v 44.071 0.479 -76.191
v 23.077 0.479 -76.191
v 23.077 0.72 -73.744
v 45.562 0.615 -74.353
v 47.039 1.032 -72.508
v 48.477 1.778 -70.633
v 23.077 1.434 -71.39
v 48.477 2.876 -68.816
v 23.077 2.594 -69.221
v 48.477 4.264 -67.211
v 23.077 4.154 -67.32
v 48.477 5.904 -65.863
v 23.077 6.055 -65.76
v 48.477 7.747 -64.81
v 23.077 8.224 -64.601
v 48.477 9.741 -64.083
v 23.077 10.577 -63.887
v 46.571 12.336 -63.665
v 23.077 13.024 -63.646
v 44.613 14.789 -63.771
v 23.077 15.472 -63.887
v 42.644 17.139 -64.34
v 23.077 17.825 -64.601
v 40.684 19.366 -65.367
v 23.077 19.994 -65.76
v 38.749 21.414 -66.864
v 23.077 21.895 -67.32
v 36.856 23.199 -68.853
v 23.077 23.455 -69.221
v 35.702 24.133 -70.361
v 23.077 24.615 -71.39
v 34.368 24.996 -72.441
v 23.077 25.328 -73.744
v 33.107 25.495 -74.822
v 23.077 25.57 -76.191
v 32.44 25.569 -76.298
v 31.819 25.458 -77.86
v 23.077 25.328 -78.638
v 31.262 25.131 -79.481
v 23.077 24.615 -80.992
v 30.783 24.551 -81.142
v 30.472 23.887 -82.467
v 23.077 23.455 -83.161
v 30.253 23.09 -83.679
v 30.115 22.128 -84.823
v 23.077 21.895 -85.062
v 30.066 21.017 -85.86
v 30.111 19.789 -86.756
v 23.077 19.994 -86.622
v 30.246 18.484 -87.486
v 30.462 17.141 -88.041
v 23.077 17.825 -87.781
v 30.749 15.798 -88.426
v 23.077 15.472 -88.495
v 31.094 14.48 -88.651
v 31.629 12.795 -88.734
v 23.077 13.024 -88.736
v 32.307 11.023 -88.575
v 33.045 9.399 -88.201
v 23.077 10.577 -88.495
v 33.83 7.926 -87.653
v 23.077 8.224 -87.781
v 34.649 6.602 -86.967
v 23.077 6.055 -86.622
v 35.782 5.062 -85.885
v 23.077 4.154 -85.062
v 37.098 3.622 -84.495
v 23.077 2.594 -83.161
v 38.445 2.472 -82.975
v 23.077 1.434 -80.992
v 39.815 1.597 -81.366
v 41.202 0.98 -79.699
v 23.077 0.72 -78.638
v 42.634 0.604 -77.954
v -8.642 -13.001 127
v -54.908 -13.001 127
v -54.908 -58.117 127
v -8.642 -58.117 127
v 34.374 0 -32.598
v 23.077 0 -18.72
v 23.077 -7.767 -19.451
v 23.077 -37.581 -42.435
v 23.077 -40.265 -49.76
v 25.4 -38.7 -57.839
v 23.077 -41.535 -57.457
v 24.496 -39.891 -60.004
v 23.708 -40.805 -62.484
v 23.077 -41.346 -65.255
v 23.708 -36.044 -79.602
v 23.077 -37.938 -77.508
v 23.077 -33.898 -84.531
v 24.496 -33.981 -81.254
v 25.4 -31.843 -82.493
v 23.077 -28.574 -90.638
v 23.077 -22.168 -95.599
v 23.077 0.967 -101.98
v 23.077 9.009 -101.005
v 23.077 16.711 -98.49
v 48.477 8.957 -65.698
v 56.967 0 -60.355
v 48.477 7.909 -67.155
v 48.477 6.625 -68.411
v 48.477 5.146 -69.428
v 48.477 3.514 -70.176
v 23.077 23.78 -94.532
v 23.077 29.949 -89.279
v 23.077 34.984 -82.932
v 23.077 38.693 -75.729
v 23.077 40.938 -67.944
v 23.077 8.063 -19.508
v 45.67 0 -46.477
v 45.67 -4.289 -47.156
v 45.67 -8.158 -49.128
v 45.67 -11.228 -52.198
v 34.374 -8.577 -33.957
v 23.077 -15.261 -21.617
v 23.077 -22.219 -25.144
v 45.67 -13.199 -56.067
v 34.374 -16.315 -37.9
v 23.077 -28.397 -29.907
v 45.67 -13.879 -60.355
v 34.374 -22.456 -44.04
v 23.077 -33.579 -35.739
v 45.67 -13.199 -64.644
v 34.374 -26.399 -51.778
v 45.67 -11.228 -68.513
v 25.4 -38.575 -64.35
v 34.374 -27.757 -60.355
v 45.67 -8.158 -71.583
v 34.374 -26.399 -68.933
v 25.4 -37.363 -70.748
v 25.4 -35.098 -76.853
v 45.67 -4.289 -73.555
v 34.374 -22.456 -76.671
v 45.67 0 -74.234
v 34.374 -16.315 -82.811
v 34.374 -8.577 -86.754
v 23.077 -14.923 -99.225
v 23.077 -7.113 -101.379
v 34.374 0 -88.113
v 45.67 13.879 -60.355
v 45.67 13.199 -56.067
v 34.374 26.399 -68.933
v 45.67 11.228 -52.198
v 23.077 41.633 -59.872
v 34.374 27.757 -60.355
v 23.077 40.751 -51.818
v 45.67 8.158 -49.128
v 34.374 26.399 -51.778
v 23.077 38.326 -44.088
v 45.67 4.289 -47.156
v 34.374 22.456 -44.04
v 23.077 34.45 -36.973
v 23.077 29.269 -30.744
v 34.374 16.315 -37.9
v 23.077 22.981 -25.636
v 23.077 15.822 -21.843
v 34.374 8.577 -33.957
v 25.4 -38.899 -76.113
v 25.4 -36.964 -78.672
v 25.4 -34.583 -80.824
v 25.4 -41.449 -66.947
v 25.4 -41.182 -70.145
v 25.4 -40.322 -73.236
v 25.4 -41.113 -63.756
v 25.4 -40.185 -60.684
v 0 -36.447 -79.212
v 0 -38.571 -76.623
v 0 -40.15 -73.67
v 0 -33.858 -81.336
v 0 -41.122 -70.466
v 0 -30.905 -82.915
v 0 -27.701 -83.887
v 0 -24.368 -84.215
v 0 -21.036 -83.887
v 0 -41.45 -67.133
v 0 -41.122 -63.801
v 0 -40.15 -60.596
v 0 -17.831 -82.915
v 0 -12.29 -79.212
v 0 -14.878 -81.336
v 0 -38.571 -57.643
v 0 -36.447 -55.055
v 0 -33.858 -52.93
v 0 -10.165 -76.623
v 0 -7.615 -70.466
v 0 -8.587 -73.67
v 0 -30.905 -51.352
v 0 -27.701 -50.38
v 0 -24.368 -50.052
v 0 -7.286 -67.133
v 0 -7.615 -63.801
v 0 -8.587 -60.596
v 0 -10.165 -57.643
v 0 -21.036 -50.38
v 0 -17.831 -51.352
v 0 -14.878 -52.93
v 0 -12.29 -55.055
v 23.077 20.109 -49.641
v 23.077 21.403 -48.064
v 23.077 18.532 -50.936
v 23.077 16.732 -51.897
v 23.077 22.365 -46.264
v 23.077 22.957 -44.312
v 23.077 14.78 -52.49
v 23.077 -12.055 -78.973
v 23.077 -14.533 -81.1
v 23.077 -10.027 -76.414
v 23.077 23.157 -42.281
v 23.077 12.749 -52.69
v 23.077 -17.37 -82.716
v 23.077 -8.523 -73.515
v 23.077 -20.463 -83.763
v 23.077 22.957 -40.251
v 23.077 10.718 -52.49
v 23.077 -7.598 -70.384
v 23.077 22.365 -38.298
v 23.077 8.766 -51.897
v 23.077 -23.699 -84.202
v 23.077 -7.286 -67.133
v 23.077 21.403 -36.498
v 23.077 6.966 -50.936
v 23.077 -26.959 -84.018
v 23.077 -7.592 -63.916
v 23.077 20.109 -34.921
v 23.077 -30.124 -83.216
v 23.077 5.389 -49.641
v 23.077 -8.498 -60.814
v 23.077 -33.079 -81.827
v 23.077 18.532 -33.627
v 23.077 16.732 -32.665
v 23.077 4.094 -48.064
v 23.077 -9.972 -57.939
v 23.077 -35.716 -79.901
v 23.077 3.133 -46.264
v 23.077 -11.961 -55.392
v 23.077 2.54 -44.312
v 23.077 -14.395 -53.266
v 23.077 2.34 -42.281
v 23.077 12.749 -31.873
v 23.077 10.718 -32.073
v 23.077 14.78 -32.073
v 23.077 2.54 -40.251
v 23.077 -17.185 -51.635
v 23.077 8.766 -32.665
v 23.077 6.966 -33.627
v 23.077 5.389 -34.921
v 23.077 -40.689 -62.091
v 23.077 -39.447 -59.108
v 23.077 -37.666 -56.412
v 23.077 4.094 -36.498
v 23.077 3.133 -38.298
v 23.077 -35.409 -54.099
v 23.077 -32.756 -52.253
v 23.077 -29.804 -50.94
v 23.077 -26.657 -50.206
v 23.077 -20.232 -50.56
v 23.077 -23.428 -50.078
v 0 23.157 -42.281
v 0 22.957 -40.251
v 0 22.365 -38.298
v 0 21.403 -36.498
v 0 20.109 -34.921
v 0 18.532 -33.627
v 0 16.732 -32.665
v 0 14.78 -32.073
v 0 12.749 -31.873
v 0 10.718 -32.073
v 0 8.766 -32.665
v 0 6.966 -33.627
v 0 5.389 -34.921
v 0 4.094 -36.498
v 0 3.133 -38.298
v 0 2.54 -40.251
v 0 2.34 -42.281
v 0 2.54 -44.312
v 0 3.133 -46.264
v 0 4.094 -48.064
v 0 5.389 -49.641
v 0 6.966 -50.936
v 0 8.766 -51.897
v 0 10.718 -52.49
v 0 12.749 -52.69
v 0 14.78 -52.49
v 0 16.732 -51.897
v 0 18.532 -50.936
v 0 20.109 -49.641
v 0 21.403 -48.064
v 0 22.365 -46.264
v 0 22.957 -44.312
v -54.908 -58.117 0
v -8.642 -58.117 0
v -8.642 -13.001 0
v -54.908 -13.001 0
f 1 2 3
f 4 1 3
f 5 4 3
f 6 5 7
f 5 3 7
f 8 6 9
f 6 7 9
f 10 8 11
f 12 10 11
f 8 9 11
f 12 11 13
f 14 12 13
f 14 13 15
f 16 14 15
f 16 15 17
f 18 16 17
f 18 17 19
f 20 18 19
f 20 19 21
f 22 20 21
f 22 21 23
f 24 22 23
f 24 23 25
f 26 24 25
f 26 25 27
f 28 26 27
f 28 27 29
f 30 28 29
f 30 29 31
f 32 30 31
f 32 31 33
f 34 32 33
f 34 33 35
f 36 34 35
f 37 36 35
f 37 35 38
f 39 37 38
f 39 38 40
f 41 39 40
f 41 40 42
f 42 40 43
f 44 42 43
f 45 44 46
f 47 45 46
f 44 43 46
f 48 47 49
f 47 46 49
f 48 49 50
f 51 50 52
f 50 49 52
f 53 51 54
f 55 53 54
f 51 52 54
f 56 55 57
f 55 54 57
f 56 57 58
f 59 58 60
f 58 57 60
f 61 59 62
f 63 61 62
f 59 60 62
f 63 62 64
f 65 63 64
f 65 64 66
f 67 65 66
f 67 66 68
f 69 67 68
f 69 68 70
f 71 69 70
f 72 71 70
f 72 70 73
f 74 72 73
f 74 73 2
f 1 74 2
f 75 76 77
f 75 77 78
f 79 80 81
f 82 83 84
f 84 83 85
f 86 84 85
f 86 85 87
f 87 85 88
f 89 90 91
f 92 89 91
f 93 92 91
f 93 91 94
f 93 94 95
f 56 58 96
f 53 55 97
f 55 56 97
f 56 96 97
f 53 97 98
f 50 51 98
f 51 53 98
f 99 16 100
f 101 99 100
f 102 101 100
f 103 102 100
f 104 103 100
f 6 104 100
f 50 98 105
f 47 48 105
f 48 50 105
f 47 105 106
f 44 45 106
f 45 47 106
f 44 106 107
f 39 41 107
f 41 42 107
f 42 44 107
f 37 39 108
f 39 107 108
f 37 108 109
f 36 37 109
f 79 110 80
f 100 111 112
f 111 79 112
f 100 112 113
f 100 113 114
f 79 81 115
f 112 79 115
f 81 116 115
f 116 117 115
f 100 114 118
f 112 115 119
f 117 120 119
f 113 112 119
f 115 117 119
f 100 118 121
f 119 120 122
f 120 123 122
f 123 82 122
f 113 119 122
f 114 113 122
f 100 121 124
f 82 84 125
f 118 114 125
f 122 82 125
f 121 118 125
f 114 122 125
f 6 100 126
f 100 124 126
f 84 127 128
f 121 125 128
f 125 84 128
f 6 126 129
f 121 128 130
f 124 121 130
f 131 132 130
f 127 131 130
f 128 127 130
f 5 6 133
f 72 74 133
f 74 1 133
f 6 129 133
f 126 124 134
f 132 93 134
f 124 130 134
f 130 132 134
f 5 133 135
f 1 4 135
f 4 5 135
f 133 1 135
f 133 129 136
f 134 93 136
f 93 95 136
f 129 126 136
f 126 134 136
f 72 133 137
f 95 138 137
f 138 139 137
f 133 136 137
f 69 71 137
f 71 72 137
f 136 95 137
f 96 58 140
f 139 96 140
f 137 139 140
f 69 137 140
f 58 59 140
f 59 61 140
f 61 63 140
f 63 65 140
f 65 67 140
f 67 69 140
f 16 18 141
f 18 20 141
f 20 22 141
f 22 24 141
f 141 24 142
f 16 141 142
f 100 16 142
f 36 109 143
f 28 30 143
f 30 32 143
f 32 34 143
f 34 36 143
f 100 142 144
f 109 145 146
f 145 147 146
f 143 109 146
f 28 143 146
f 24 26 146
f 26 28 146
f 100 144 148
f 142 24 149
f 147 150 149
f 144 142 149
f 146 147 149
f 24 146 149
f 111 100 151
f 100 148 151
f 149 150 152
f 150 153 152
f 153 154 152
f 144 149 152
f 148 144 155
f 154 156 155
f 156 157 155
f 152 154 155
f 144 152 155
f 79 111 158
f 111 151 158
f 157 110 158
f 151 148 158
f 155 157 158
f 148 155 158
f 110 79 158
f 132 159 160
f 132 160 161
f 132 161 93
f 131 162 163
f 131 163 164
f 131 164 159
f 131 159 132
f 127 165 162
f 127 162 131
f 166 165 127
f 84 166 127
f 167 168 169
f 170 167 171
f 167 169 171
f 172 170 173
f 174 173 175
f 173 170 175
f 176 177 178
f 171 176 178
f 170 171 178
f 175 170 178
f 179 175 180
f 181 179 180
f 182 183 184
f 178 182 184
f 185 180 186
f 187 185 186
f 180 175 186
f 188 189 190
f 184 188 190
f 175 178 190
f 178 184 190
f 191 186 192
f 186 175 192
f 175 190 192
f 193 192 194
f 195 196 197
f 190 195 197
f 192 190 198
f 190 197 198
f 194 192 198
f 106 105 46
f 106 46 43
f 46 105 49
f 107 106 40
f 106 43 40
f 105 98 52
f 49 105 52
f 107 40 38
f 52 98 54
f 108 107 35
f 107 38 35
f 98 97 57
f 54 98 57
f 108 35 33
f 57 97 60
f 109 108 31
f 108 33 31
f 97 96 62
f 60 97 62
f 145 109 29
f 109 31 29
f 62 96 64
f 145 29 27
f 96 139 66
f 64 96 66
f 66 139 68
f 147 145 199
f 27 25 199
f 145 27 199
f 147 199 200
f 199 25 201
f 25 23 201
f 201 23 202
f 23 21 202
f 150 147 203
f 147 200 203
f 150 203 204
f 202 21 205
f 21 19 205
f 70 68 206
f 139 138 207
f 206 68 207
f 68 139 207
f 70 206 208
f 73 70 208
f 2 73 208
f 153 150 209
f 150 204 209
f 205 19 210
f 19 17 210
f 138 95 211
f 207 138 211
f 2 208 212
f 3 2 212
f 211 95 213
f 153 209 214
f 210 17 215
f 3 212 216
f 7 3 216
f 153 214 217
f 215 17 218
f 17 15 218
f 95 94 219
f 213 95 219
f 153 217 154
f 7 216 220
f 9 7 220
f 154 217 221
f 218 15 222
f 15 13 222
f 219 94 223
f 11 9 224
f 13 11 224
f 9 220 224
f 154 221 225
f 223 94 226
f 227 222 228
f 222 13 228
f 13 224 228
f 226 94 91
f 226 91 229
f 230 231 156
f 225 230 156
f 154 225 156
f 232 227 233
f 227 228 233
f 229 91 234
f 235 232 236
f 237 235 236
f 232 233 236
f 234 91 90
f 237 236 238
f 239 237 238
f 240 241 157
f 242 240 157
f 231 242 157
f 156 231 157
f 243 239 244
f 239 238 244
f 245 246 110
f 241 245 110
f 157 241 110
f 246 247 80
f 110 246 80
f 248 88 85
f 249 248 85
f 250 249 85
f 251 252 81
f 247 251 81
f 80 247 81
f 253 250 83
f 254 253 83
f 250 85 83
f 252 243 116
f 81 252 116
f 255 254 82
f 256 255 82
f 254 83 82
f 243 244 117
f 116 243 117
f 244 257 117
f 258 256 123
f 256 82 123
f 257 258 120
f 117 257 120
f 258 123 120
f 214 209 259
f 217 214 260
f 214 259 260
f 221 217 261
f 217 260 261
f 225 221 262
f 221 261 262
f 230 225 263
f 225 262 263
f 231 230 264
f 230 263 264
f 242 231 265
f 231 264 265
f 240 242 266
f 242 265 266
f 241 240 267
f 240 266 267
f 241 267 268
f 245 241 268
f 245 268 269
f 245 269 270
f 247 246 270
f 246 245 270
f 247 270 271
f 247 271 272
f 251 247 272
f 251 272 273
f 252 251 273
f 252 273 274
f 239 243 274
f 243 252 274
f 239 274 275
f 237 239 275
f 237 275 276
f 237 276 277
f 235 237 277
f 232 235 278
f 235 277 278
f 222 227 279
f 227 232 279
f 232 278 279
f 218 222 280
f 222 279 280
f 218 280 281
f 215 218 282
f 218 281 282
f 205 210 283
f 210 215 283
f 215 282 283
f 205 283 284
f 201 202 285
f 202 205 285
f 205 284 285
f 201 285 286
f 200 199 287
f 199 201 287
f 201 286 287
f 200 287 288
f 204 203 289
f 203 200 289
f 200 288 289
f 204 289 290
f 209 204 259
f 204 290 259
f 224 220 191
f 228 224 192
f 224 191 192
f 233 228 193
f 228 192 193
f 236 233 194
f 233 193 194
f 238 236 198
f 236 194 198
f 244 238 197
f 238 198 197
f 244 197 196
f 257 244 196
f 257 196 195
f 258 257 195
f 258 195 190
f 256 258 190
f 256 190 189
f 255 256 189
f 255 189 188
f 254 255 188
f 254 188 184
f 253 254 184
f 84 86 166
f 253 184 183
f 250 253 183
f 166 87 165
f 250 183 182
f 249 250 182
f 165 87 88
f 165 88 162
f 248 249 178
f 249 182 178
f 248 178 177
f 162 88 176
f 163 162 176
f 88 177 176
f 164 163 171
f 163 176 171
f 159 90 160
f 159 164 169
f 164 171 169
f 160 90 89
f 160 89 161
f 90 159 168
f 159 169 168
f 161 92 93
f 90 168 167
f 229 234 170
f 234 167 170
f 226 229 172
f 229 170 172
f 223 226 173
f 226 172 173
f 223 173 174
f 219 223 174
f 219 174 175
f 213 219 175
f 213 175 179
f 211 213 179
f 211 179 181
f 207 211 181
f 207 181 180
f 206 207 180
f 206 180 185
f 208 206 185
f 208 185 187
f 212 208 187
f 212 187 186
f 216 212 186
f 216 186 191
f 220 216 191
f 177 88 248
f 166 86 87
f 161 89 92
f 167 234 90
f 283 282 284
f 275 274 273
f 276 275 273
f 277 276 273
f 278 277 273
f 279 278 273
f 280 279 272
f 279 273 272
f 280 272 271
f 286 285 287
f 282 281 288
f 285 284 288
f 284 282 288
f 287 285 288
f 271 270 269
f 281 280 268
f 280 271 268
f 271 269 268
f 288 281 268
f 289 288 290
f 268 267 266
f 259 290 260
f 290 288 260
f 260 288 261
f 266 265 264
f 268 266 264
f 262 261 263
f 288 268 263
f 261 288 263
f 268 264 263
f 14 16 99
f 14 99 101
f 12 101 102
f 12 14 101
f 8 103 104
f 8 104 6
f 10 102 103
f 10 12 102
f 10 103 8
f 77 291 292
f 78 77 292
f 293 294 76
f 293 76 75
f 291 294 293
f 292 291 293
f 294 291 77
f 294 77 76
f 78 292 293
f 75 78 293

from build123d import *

# Parameters (mm, degrees)
F0_W     = 46.26578
F0_H     = 45.115725
F1_DEPTH = 127
F4_R     = 10.408583
F4_R_2   = 17.081722
F5_DEPTH = 25.4
F6_R     = 12.545066
F7_DEPTH = 25.4


with BuildPart() as f1:
    # F0 (on Top) → F1 (new body)
    with BuildSketch(Plane.XY):
        with Locations((-31.774823, -35.558864)):
            Rectangle(F0_W, F0_H)
    extrude(amount=F1_DEPTH)


with BuildPart() as f3:
    # F2 (on Front) → F3 (revolve)
    with BuildSketch(Plane.XZ):
        Polygon((56.966539, -60.355488), (23.077099, -18.719885), (23.077099, -60.355488), align=None)
    revolve(axis=Axis((40.021819, 0, -60.355488), (1, 0, 0)))

    # F4 (on Right) → F5 (join)
    with BuildSketch(Plane.YZ):
        with Locations((12.74889, -42.281121)):
            Circle(F4_R)
        with Locations((-24.368122, -67.133382)):
            Circle(F4_R_2)
    extrude(amount=F5_DEPTH)

    # F6 (on face) → F7 (cut)
    with BuildSketch(Plane(origin=(23.077099, 0, 0), x_dir=(0, -1, 0), z_dir=(-1, 0, 0))):
        with Locations((-13.024477, -76.190986)):
            Circle(F6_R)
    extrude(amount=-F7_DEPTH, mode=Mode.SUBTRACT)


solid = Compound([f1.part, f3.part])
